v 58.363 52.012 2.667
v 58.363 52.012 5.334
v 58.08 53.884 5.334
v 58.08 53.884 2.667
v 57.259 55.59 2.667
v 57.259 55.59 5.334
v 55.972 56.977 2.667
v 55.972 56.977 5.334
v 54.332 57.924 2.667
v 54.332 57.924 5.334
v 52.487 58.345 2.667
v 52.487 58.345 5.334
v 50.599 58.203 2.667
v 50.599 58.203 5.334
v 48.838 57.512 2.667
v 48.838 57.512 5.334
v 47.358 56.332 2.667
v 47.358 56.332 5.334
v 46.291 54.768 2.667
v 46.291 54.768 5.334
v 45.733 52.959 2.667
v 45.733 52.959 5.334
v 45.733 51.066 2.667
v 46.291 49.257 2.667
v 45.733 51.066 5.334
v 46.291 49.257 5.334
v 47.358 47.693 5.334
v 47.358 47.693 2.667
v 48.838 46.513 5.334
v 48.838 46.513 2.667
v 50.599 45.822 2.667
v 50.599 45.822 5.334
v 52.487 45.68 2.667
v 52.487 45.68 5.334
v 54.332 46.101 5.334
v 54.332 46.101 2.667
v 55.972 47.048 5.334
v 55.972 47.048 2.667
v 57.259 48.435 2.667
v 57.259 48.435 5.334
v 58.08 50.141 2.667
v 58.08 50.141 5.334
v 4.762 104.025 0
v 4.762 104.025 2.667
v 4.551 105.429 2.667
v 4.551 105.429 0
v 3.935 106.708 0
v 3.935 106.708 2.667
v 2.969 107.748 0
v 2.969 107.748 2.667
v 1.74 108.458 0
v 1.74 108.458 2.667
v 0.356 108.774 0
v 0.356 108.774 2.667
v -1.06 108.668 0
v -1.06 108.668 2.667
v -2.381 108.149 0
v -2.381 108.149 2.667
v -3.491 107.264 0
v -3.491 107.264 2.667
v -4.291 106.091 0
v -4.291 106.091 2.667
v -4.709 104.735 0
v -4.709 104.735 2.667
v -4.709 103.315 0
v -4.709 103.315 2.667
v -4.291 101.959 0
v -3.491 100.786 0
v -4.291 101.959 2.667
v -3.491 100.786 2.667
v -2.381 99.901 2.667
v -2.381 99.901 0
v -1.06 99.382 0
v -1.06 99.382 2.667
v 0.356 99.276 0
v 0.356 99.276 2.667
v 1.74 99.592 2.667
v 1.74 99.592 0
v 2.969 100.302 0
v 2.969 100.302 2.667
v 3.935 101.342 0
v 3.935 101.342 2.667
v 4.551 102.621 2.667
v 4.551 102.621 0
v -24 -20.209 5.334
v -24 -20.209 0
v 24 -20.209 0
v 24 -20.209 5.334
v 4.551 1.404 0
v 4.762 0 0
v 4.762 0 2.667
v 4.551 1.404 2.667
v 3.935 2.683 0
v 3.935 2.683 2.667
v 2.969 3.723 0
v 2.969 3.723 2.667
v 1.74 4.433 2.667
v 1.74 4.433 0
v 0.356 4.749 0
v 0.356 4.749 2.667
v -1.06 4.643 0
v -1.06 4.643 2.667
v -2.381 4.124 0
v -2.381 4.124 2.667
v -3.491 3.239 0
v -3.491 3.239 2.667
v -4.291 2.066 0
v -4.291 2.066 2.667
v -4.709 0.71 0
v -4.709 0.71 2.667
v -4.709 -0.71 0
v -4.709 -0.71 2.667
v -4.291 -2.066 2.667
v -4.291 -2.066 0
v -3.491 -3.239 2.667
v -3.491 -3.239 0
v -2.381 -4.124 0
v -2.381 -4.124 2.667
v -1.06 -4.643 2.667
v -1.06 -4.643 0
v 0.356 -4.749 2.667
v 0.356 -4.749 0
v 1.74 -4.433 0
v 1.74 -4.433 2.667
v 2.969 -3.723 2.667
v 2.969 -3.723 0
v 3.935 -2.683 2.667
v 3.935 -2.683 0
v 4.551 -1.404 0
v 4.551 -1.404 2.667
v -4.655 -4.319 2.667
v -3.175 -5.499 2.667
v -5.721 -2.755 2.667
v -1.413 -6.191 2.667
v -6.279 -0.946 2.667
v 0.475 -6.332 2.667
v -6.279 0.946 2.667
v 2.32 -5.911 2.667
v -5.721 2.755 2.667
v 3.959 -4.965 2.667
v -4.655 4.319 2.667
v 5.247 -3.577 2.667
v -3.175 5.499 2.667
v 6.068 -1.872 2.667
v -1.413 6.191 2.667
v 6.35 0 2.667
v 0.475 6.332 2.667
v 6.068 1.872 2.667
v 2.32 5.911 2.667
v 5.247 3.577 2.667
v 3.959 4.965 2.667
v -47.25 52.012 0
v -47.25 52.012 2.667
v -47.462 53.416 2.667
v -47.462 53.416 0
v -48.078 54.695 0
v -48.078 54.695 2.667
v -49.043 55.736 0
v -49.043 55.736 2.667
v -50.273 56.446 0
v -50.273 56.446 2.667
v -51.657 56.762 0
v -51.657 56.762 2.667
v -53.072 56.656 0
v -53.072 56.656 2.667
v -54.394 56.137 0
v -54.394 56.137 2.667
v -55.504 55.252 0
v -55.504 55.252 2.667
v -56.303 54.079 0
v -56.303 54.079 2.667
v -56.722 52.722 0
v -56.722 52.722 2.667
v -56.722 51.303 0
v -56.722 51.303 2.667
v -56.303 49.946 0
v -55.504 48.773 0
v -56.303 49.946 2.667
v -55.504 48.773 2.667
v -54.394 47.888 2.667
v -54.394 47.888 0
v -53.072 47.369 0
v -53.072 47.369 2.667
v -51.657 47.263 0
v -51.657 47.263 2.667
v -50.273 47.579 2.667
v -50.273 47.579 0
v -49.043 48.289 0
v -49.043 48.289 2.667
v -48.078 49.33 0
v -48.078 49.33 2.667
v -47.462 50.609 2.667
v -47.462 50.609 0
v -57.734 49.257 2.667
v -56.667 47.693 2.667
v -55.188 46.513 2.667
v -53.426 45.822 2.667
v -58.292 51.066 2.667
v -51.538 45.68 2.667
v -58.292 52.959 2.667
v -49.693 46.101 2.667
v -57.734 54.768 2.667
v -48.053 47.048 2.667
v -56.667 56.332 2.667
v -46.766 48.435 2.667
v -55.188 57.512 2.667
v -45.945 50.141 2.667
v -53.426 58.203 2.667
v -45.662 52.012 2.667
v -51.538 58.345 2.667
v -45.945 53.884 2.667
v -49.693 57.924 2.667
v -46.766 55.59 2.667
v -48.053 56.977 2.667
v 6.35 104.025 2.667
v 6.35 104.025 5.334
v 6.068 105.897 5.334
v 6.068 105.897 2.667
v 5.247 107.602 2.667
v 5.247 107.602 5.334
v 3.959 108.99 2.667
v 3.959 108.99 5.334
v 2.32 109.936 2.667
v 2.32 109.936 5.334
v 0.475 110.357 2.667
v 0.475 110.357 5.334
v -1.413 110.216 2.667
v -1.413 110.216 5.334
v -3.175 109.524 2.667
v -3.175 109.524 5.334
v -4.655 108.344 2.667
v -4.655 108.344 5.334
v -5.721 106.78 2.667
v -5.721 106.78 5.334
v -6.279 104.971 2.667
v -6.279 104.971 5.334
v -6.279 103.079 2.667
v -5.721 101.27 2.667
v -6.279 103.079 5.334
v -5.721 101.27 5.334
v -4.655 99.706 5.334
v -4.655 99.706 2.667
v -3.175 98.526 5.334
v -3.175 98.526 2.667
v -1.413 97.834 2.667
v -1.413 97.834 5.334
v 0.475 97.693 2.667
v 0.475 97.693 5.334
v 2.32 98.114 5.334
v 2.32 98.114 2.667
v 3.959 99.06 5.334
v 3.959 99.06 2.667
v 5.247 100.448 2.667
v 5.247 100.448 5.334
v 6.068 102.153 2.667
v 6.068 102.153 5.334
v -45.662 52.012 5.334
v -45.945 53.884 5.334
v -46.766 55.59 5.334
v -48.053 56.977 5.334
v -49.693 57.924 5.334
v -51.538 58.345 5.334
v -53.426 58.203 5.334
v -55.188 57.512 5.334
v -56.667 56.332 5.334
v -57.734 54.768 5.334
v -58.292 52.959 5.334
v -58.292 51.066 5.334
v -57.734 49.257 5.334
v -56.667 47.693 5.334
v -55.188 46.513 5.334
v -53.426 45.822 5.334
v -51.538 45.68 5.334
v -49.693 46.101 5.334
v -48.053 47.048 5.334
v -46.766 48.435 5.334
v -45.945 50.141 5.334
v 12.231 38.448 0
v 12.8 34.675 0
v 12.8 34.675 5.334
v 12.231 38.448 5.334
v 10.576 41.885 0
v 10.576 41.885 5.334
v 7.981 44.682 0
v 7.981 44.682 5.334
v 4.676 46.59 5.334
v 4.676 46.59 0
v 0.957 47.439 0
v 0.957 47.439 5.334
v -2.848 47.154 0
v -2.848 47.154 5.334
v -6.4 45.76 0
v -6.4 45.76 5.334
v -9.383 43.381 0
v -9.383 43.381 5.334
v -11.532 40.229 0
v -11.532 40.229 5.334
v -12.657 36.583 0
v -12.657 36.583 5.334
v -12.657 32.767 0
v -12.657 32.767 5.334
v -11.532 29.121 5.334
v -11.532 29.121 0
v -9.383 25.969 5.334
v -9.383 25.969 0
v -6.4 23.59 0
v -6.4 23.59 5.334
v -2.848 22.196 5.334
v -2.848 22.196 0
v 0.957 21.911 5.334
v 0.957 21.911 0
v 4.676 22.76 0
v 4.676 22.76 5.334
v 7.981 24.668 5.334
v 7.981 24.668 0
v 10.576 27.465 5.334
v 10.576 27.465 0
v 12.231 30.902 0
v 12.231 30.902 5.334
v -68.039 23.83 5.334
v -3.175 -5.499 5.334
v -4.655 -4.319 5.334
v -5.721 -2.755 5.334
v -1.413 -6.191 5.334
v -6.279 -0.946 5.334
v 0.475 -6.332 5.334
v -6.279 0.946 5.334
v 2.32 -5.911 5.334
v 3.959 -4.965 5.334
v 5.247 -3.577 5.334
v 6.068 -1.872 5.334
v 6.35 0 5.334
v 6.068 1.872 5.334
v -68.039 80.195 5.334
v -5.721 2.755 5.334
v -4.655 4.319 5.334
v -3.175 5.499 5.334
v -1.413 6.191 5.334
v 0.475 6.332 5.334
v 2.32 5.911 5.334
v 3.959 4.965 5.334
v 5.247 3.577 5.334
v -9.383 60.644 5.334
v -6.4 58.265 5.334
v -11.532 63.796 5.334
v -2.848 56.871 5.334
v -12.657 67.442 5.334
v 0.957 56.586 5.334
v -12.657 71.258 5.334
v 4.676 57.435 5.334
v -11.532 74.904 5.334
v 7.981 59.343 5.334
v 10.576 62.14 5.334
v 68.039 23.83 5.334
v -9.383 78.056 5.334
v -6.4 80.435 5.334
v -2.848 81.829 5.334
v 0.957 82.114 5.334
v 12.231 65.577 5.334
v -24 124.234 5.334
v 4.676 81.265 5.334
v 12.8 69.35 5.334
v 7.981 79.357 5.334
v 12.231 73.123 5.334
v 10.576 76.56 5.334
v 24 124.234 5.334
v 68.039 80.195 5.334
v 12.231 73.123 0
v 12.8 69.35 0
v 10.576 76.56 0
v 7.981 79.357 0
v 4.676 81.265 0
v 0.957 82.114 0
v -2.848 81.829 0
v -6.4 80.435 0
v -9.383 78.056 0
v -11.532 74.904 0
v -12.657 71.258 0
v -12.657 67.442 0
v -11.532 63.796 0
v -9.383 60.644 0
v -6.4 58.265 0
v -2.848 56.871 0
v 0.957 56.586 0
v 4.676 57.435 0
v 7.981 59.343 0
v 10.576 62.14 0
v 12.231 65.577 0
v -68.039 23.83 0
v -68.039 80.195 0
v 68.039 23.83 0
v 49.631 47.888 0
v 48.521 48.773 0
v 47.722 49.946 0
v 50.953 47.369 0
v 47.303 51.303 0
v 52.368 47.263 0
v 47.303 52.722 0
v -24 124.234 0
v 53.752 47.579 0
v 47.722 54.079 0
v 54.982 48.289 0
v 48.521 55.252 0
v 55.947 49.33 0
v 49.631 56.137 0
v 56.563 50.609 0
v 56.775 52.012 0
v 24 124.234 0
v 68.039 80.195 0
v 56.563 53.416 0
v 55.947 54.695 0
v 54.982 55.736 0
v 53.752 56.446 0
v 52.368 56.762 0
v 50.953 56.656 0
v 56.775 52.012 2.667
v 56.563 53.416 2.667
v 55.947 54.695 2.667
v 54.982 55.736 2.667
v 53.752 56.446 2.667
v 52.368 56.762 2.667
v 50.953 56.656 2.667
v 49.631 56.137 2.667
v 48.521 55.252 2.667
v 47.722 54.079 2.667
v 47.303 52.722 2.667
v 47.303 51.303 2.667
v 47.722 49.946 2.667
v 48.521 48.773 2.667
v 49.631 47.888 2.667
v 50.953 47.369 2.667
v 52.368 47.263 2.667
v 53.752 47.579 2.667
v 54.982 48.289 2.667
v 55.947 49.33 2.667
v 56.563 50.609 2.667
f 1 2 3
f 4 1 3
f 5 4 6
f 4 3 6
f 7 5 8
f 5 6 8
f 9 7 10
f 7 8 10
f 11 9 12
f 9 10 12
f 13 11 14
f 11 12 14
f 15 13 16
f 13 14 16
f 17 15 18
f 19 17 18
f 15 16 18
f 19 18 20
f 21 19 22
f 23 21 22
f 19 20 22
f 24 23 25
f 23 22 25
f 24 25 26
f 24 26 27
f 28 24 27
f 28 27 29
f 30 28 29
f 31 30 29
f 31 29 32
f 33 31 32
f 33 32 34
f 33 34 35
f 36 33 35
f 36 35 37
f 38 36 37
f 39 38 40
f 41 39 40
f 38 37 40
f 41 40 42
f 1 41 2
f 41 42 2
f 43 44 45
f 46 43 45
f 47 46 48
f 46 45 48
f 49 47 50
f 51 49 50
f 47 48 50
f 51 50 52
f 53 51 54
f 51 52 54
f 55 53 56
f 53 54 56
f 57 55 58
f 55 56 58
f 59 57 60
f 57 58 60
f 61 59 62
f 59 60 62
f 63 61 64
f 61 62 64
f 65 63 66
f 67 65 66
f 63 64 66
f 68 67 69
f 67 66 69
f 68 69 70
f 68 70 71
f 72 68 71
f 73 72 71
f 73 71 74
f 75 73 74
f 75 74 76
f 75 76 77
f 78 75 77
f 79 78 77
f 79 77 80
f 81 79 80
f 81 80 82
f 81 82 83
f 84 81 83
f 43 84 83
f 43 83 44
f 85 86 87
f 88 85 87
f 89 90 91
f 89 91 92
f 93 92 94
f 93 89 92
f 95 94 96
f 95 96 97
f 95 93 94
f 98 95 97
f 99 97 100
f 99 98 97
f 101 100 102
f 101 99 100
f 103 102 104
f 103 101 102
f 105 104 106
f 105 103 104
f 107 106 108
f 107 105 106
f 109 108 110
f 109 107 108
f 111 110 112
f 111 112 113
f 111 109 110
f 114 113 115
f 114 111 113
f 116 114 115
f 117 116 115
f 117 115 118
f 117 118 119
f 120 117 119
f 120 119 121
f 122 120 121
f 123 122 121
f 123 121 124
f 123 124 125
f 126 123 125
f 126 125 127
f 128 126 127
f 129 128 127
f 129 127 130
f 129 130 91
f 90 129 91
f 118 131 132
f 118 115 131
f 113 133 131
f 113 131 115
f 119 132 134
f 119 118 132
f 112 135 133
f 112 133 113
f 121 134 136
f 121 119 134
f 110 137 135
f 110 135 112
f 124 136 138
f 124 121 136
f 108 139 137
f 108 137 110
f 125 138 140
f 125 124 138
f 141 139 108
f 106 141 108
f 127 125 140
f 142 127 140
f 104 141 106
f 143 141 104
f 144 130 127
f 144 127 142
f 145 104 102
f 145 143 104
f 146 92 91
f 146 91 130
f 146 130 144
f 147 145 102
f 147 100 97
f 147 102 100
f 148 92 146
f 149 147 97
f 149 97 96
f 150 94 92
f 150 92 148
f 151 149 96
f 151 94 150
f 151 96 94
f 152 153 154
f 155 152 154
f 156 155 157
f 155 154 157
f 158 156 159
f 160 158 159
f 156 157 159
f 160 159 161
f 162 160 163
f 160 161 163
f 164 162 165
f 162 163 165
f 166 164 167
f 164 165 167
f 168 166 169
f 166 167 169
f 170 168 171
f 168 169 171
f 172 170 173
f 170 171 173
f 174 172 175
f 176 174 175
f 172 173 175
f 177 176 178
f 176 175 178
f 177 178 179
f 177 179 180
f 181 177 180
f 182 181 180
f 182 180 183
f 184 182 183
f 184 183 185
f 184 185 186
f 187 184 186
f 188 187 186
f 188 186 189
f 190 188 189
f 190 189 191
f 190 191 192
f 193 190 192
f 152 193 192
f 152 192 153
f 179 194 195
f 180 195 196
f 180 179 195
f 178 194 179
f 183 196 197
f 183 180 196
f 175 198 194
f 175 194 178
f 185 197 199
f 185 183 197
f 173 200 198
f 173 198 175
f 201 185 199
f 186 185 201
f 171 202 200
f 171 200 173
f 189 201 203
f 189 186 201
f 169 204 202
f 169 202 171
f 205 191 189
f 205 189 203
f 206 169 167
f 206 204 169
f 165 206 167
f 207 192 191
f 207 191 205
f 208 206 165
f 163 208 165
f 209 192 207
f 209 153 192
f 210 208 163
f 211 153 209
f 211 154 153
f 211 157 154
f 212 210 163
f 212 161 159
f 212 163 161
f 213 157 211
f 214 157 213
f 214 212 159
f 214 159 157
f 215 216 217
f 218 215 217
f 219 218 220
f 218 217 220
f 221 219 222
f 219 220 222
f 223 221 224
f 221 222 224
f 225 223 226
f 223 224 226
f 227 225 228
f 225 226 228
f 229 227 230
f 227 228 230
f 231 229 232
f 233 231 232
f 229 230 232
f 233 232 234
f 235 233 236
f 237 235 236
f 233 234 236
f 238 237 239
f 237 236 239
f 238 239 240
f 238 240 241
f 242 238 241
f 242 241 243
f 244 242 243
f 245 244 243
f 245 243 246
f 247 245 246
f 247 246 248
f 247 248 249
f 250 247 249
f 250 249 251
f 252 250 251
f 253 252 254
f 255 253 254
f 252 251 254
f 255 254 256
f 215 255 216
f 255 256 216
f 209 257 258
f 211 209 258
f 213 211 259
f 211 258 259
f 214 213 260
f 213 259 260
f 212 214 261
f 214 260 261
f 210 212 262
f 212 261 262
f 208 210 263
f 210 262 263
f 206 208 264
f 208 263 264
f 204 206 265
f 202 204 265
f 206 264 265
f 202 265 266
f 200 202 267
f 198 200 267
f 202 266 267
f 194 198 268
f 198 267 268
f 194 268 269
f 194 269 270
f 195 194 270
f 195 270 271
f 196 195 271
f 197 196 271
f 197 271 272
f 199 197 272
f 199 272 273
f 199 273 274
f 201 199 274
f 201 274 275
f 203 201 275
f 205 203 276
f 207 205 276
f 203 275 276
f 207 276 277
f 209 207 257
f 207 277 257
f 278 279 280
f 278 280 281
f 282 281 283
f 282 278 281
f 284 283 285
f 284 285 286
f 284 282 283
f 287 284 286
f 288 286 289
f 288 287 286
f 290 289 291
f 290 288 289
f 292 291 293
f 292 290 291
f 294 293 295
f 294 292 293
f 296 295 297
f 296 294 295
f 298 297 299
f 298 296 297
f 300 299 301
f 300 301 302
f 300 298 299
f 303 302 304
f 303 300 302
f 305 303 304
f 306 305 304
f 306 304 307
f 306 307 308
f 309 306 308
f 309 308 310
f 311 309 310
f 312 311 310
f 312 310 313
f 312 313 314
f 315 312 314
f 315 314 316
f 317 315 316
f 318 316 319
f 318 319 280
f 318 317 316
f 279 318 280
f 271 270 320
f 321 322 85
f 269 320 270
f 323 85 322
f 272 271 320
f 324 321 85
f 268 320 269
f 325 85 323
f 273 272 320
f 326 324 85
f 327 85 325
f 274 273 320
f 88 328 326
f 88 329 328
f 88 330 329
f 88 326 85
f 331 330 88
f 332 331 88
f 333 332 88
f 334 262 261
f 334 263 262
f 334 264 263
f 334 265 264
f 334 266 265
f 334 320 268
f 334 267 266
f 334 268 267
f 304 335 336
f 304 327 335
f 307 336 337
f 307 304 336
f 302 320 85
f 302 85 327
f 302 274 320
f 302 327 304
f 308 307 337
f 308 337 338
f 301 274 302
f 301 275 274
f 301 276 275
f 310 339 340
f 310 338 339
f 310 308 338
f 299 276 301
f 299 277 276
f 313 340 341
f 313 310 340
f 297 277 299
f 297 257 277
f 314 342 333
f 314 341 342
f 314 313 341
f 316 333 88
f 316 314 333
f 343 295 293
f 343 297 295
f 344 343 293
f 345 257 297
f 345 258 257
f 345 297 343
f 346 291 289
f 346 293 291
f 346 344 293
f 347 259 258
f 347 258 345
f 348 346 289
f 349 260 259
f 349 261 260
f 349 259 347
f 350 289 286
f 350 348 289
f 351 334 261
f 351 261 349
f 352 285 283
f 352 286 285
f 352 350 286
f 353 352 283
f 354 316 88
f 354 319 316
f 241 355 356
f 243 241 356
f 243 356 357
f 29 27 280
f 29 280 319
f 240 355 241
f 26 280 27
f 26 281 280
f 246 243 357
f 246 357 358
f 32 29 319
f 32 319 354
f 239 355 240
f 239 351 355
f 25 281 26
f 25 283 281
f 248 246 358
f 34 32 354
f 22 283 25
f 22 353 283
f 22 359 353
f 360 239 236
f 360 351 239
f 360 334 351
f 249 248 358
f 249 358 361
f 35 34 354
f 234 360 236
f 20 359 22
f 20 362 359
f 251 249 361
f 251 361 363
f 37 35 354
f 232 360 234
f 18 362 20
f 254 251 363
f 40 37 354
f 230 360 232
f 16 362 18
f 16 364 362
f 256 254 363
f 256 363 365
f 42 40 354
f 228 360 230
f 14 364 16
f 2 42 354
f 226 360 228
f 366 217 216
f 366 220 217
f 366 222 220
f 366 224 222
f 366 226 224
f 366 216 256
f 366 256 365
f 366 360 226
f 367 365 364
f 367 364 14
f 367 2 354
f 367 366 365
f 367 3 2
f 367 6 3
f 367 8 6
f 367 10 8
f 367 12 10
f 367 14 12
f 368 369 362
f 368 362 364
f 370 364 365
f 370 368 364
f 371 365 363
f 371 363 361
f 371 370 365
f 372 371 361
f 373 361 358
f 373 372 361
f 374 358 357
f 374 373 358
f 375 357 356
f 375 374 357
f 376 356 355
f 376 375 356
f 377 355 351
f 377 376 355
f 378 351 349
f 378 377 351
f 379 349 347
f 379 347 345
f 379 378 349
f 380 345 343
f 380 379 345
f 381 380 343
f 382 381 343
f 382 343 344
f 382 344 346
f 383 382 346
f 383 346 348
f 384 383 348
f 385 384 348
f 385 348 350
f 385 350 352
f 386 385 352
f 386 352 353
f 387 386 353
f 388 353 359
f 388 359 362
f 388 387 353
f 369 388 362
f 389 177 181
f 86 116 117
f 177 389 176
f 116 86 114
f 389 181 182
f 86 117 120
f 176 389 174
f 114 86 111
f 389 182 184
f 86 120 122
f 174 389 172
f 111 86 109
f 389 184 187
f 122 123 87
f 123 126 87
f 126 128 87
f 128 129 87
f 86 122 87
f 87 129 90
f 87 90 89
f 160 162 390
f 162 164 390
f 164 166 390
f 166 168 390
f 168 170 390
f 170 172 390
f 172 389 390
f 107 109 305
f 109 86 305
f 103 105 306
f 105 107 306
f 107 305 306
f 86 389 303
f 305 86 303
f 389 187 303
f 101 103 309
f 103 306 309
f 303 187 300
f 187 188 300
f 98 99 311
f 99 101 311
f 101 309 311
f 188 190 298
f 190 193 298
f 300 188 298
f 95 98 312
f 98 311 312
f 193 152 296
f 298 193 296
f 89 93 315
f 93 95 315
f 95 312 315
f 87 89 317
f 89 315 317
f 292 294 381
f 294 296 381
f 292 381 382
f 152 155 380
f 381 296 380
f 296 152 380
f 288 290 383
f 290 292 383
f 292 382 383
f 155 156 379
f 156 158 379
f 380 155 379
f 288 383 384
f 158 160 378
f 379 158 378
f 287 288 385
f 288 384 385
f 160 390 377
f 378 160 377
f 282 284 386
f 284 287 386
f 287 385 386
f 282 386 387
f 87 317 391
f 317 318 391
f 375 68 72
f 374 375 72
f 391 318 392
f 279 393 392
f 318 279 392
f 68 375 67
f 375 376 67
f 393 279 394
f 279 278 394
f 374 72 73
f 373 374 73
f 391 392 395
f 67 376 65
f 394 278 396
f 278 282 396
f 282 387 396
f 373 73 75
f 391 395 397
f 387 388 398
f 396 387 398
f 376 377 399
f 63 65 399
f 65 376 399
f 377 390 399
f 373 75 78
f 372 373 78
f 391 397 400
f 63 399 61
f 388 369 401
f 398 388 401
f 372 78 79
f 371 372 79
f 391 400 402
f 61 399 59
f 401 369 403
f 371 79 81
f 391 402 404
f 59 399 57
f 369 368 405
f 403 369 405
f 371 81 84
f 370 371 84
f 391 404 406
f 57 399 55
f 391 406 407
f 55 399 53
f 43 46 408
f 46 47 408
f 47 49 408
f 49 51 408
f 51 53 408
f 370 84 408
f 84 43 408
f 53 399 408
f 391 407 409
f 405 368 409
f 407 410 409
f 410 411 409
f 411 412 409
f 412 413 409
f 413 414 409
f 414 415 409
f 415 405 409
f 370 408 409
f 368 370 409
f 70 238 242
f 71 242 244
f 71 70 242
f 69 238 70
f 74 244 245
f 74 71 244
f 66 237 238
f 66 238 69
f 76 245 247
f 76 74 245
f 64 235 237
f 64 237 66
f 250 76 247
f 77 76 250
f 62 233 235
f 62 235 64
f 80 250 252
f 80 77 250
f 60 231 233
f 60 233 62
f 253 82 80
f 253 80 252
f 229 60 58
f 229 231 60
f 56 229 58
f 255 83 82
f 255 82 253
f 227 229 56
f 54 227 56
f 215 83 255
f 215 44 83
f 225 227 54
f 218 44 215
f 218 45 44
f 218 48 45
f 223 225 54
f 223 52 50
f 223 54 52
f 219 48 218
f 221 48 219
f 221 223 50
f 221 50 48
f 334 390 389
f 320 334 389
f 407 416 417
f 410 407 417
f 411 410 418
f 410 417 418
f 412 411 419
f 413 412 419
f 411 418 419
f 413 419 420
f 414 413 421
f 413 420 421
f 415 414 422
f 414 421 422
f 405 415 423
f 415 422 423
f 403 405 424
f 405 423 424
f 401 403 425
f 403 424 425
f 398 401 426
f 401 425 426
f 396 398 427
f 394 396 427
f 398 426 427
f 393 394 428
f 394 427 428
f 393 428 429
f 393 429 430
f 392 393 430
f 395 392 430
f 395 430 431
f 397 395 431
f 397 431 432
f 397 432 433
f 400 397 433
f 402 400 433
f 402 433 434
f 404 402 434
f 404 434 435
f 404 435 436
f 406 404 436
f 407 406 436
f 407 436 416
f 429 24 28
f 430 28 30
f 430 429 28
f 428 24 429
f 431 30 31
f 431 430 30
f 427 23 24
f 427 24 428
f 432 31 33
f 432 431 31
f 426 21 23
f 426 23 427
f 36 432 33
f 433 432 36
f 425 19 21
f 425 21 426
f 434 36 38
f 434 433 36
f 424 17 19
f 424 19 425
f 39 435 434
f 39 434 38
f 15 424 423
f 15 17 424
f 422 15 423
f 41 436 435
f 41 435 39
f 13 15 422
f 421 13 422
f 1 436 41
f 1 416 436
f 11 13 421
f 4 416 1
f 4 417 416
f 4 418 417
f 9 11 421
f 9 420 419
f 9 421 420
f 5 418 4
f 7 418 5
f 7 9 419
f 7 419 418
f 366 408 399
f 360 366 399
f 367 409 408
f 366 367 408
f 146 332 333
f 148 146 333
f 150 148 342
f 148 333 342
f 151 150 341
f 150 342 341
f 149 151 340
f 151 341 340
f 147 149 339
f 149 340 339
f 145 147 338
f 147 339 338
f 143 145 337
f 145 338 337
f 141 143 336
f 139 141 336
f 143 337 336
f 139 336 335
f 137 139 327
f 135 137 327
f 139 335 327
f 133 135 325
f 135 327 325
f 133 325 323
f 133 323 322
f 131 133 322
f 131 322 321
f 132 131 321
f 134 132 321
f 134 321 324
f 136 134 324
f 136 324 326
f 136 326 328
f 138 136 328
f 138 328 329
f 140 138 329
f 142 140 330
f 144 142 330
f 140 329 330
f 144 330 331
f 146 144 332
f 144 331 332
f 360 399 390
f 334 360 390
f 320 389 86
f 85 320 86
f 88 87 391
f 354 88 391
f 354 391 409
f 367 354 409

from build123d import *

# Parameters (mm, degrees)
SKETCH2_R           = 4.7625
SKETCH2_R_2         = 12.8
BOSS_EXTRUDE2_DEPTH = 5.334
CUT_EXTRUDE3_START  = -2.667
SKETCH3_R           = 6.35
SKETCH3_R_2         = 4.7625
CUT_EXTRUDE3_DEPTH  = 2.667
SKETCH3_2_R         = 4.7625
CUT_EXTRUDE4_DEPTH  = 142.745248595


with BuildPart() as part:
    # Sketch2 → Boss-Extrude2 (new body)
    with BuildSketch(Plane.XY):
        Polygon((-68.038646731, 23.829969758), (-24, -20.208676973), (24, -20.208676973), (68.038646731, 23.829969758), (68.038646731, 80.195030242), (24, 124.233676973), (-24, 124.233676973), (-68.038646731, 80.195030242), align=None)
        Circle(SKETCH2_R, mode=Mode.SUBTRACT)
        with Locations((0, 34.675)):
            Circle(SKETCH2_R_2, mode=Mode.SUBTRACT)
        with Locations((0, 69.35)):
            Circle(SKETCH2_R_2, mode=Mode.SUBTRACT)
    extrude(amount=BOSS_EXTRUDE2_DEPTH)

    # Sketch3 → Cut-Extrude3 (cut)
    # profile 1 of 4: a face of its own
    with BuildSketch(Plane.XY.offset(5.334).offset(CUT_EXTRUDE3_START)):
        Circle(SKETCH3_R)
        Circle(SKETCH3_R_2, mode=Mode.SUBTRACT)
    # profile 2 of 4: a face of its own
    with BuildSketch(Plane.XY.offset(5.334).offset(CUT_EXTRUDE3_START)):
        with Locations((52.0125, 52.0125)):
            Circle(SKETCH3_R)
        with Locations((52.0125, 52.0125)):
            Circle(SKETCH3_R_2, mode=Mode.SUBTRACT)
    # profile 3 of 4: a face of its own
    with BuildSketch(Plane.XY.offset(5.334).offset(CUT_EXTRUDE3_START)):
        with Locations((0, 104.025)):
            Circle(SKETCH3_R)
        with Locations((0, 104.025)):
            Circle(SKETCH3_R_2, mode=Mode.SUBTRACT)
    # profile 4 of 4: a face of its own
    with BuildSketch(Plane.XY.offset(5.334).offset(CUT_EXTRUDE3_START)):
        with Locations((-52.0125, 52.0125)):
            Circle(SKETCH3_R)
        with Locations((-52.0125, 52.0125)):
            Circle(SKETCH3_R_2, mode=Mode.SUBTRACT)
    extrude(amount=CUT_EXTRUDE3_DEPTH, mode=Mode.SUBTRACT)

    # Sketch3_2 → Cut-Extrude4 (cut, through all)
    with BuildSketch(Plane.XY.offset(5.334)):
        with Locations((52.0125, 52.0125)):
            Circle(SKETCH3_2_R)
        with Locations((0, 104.025)):
            Circle(SKETCH3_2_R)
        with Locations((-52.0125, 52.0125)):
            Circle(SKETCH3_2_R)
    extrude(amount=-CUT_EXTRUDE4_DEPTH, mode=Mode.SUBTRACT)


solid = part.part
